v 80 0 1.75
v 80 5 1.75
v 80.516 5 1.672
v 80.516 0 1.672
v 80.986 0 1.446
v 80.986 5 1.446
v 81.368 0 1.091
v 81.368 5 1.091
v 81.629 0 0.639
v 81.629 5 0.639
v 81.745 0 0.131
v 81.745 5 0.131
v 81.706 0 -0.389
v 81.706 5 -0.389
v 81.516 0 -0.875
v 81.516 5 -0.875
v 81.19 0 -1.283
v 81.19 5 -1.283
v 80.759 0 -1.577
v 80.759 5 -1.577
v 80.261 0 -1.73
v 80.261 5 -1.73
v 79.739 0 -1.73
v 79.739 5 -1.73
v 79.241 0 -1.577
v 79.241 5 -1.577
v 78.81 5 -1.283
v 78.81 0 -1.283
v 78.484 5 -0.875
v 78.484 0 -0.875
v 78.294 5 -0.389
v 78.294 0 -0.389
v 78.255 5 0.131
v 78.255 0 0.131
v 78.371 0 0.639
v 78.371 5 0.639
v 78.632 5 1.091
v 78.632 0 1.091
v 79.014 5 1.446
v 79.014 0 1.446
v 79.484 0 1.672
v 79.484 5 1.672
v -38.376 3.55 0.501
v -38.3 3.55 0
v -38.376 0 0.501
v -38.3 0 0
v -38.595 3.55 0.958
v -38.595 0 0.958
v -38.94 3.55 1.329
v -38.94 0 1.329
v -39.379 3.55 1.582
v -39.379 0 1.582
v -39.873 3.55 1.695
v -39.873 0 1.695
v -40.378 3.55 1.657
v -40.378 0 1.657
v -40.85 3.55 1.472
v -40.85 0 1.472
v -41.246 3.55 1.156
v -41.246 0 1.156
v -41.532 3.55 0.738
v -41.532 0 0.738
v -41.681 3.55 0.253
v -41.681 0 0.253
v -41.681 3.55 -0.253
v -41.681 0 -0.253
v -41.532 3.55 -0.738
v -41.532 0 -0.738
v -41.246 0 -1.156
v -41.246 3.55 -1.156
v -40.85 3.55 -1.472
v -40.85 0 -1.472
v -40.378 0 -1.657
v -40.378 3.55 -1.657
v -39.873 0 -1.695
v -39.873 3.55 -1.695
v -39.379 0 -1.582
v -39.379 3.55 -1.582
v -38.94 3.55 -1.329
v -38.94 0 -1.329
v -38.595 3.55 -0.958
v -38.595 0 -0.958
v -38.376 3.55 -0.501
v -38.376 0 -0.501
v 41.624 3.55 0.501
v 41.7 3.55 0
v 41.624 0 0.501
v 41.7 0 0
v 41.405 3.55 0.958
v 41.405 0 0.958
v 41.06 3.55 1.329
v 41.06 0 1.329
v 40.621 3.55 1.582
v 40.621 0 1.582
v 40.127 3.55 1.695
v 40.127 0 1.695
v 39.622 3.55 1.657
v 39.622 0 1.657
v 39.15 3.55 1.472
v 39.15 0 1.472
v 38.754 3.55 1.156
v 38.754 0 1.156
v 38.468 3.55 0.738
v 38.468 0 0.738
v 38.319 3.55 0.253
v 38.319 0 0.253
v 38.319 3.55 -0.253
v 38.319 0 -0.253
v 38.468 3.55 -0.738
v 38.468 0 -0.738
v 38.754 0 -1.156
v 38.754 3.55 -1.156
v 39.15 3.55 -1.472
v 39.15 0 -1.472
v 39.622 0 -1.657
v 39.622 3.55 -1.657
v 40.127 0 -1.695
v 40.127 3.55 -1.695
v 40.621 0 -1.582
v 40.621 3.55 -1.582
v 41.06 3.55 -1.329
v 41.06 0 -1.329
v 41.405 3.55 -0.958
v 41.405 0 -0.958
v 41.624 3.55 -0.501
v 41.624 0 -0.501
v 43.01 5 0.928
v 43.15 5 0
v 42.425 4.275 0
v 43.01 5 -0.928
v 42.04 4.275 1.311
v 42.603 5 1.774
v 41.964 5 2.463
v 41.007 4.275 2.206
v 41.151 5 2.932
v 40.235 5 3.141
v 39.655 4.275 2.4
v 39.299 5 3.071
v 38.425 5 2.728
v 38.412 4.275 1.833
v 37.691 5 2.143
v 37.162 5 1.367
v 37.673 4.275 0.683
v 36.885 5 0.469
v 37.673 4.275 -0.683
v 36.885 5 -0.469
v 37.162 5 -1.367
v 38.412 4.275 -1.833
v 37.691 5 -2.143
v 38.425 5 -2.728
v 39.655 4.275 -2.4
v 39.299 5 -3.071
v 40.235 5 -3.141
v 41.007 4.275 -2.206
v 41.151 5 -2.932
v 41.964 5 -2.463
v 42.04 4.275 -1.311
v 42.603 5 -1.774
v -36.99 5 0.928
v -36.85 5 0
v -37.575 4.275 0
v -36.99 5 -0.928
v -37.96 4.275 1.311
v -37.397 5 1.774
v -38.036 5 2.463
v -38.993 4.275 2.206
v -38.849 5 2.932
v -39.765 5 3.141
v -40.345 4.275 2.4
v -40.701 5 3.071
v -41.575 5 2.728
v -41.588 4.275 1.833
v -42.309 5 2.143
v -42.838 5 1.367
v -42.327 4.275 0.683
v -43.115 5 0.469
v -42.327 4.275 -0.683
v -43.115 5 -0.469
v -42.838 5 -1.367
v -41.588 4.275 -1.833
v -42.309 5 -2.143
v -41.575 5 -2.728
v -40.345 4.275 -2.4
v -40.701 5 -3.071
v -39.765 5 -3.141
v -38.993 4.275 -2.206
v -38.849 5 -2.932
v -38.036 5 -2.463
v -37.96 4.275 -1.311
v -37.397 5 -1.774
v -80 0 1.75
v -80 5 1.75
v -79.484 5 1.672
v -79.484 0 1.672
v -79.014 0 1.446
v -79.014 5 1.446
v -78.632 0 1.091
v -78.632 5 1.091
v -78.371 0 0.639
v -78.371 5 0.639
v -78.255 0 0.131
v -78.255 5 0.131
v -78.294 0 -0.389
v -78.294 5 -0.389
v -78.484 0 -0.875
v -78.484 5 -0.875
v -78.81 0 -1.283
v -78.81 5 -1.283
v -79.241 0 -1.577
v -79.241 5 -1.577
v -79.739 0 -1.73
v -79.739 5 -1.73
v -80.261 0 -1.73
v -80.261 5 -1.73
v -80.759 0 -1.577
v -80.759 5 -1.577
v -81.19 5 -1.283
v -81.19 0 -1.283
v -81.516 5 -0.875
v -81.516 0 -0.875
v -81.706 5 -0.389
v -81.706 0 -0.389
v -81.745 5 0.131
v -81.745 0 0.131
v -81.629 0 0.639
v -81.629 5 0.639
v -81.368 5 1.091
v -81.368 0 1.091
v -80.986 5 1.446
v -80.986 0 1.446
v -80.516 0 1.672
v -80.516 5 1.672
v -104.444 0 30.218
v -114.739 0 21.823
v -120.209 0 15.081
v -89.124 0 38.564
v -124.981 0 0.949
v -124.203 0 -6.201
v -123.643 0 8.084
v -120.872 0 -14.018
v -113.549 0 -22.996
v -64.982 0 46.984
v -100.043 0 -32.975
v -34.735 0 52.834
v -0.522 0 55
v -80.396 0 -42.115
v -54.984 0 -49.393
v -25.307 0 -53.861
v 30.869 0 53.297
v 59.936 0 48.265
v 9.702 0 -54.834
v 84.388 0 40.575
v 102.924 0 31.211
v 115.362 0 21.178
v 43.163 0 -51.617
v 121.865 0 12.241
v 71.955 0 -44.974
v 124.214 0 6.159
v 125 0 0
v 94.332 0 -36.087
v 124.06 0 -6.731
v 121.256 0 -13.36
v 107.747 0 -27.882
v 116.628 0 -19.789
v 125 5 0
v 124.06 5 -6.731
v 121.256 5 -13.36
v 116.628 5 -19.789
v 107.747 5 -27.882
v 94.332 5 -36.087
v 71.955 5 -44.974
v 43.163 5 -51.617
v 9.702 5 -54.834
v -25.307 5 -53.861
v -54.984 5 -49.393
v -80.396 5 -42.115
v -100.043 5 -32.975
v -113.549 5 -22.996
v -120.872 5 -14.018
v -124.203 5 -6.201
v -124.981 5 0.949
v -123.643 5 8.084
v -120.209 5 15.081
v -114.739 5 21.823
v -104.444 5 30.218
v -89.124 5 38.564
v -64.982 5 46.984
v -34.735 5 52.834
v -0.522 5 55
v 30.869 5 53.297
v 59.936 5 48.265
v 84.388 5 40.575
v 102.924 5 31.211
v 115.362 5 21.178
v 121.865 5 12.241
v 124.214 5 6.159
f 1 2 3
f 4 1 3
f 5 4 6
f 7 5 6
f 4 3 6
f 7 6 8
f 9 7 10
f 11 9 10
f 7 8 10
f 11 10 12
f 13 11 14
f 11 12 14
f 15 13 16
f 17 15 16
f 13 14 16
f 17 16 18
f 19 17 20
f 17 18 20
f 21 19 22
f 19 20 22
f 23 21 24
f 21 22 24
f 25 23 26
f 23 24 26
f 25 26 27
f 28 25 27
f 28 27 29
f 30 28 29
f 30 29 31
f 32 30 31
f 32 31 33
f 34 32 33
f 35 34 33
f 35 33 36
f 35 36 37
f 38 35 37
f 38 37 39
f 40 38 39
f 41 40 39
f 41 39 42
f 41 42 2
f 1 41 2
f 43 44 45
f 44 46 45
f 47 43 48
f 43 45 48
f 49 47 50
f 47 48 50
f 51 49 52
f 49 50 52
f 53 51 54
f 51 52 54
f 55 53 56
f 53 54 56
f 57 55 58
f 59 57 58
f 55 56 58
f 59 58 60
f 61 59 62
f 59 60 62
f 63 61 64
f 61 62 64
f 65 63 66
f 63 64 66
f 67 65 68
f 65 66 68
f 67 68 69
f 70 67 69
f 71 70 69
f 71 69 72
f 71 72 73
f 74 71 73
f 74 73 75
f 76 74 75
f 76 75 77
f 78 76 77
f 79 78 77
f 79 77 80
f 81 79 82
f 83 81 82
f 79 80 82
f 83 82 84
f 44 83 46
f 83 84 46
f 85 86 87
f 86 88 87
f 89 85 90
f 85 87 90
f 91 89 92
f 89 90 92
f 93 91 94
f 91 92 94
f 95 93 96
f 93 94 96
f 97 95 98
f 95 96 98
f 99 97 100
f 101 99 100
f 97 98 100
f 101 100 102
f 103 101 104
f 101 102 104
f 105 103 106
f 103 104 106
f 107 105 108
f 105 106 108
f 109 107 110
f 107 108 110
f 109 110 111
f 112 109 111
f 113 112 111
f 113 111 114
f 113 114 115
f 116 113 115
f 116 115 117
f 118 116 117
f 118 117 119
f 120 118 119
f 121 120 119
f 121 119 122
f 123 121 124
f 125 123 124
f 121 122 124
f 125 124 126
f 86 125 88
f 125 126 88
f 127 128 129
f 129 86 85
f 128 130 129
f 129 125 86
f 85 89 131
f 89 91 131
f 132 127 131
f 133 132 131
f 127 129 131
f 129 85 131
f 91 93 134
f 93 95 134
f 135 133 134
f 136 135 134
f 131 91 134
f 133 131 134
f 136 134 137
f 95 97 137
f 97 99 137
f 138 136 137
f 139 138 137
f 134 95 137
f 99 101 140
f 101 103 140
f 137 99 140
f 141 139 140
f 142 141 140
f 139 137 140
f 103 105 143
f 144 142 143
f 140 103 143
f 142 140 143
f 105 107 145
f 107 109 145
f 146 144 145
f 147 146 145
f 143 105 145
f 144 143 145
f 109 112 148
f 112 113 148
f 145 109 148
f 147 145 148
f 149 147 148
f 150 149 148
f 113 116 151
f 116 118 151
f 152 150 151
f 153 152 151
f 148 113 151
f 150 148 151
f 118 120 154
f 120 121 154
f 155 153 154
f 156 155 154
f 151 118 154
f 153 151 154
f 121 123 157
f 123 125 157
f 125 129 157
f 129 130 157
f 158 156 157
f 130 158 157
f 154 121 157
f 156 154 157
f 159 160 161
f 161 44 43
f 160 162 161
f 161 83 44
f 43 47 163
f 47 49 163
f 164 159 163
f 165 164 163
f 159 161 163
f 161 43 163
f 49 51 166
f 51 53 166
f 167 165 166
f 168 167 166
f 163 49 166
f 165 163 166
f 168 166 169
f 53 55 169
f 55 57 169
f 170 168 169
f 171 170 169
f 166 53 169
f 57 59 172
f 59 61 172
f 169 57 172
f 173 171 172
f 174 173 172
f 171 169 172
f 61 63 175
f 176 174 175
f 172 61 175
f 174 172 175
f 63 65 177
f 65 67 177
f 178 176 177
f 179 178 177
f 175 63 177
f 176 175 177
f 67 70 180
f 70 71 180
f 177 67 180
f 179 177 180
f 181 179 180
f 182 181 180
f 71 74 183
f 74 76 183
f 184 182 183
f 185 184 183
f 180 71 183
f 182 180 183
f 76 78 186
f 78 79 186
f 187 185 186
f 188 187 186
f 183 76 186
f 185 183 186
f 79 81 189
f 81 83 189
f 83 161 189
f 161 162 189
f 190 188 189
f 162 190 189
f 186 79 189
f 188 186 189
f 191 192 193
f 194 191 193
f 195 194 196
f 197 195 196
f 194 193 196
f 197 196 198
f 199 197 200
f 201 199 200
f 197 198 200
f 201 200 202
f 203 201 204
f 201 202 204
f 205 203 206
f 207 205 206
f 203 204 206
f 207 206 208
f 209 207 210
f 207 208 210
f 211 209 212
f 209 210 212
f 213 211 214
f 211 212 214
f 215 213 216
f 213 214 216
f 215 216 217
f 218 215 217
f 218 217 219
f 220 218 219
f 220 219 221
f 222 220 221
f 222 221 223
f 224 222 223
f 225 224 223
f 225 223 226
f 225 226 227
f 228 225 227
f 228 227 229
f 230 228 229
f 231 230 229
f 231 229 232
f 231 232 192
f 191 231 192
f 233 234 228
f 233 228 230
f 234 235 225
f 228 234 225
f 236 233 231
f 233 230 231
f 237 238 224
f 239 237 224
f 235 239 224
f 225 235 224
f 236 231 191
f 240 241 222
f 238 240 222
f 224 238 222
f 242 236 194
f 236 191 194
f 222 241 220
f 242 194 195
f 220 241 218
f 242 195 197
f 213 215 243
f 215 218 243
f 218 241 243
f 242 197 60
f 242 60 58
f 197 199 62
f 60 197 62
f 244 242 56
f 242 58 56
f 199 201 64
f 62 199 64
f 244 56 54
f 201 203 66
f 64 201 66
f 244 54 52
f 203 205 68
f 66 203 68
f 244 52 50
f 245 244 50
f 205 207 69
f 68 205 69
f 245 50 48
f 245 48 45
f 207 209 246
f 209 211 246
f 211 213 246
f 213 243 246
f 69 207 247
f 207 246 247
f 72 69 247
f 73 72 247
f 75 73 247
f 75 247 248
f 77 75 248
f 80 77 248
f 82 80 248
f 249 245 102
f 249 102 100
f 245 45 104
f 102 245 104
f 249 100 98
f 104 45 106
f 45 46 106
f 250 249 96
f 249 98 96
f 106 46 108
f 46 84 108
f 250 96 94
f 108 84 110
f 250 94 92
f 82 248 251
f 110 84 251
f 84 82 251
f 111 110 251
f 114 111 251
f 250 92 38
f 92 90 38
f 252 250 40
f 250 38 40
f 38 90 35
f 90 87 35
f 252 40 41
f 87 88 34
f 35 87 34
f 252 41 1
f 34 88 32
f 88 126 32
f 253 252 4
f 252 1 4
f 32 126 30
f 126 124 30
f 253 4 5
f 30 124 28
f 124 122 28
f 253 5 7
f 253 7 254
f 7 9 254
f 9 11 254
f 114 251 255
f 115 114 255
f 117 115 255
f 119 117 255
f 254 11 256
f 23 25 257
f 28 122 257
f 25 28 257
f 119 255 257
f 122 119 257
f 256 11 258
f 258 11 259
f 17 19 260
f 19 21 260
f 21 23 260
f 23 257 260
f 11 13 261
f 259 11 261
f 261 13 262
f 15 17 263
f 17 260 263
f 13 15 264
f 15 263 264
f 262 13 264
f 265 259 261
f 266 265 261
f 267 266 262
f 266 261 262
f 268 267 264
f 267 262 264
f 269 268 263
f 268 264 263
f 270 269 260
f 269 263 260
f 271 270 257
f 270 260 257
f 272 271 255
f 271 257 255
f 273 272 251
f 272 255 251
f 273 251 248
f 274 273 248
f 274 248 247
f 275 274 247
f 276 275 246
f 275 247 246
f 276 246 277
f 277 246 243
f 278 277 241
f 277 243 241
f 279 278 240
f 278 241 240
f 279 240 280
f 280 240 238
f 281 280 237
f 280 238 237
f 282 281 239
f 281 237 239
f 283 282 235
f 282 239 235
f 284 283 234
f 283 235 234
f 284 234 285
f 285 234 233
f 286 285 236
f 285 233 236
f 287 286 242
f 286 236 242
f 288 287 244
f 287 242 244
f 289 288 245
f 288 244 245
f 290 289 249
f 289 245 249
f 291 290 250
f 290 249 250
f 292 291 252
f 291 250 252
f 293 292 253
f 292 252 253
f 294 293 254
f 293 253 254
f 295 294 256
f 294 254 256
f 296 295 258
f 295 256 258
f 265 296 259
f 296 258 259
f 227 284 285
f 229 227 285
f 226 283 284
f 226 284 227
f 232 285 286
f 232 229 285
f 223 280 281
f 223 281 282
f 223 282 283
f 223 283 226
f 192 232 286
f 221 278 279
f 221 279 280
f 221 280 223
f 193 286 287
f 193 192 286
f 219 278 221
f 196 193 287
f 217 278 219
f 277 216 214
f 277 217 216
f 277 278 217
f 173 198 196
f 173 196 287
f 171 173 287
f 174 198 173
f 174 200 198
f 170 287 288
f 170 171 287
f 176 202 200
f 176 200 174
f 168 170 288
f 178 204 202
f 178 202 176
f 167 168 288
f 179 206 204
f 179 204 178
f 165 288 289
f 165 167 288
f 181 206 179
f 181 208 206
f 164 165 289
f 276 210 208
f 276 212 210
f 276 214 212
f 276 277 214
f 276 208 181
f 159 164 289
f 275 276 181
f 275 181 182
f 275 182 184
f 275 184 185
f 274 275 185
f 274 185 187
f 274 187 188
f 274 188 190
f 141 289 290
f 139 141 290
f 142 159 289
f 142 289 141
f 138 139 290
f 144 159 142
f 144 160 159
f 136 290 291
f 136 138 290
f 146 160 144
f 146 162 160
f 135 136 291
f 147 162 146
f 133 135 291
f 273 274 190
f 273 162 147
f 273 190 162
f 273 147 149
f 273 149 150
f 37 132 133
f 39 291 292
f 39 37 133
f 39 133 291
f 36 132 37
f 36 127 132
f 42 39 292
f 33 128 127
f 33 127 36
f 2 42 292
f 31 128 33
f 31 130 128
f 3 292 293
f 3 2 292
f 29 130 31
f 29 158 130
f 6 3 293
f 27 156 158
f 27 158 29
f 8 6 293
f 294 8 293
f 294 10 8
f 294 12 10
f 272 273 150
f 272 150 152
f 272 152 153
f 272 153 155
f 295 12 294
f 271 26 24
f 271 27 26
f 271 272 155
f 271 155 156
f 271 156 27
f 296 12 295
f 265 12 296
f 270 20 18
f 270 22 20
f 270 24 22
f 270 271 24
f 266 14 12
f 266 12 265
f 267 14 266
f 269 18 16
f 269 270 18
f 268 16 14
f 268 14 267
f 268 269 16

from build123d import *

# Parameters (mm, degrees)
SKETCH_1_RX                  = 125
SKETCH_1_RY                  = 55
EXTRUDE_1_DEPTH              = 5
HOLE_WIZARD_M3_1_D           = 3.4
HOLE_WIZARD_M3_1_CSINK_D     = 6.3
HOLE_WIZARD_M3_1_CSINK_ANGLE = 90
SKETCH_8_R                   = 1.75
CUT_EXTRUDE_1_DEPTH          = 137.656503687


with BuildPart() as part:
    # ｽｹｯﾁ1 → ﾎﾞｽ - 押し出し1 (new body)
    with BuildSketch(Plane(origin=(0, 0, 0), x_dir=(1, 0, 0), z_dir=(0, 1, 0))):
        with Locations((0, 0)):
            Ellipse(SKETCH_1_RX, SKETCH_1_RY)
    extrude(amount=EXTRUDE_1_DEPTH)

    # M3 丸皿小ねじ用皿穴1 (through all)
    with Locations(Plane(origin=(0, 5, 0), x_dir=(-1, 0, 0), z_dir=(0, 1, 0))):
        with Locations((40, 0), (-40, 0)):
            CounterSinkHole(HOLE_WIZARD_M3_1_D / 2, HOLE_WIZARD_M3_1_CSINK_D / 2, counter_sink_angle=HOLE_WIZARD_M3_1_CSINK_ANGLE)

    # ｽｹｯﾁ8 → ｶｯﾄ - 押し出し1 (cut, through all)
    with BuildSketch(Plane(origin=(0, 5, 0), x_dir=(1, 0, 0), z_dir=(0, 1, 0))):
        with Locations(Location((-80, 0, 0), (0, 0, 270))):
            Circle(SKETCH_8_R)
        with Locations(Location((80, 0, 0), (0, 0, 270))):
            Circle(SKETCH_8_R)
    extrude(amount=-CUT_EXTRUDE_1_DEPTH, mode=Mode.SUBTRACT)


solid = part.part
